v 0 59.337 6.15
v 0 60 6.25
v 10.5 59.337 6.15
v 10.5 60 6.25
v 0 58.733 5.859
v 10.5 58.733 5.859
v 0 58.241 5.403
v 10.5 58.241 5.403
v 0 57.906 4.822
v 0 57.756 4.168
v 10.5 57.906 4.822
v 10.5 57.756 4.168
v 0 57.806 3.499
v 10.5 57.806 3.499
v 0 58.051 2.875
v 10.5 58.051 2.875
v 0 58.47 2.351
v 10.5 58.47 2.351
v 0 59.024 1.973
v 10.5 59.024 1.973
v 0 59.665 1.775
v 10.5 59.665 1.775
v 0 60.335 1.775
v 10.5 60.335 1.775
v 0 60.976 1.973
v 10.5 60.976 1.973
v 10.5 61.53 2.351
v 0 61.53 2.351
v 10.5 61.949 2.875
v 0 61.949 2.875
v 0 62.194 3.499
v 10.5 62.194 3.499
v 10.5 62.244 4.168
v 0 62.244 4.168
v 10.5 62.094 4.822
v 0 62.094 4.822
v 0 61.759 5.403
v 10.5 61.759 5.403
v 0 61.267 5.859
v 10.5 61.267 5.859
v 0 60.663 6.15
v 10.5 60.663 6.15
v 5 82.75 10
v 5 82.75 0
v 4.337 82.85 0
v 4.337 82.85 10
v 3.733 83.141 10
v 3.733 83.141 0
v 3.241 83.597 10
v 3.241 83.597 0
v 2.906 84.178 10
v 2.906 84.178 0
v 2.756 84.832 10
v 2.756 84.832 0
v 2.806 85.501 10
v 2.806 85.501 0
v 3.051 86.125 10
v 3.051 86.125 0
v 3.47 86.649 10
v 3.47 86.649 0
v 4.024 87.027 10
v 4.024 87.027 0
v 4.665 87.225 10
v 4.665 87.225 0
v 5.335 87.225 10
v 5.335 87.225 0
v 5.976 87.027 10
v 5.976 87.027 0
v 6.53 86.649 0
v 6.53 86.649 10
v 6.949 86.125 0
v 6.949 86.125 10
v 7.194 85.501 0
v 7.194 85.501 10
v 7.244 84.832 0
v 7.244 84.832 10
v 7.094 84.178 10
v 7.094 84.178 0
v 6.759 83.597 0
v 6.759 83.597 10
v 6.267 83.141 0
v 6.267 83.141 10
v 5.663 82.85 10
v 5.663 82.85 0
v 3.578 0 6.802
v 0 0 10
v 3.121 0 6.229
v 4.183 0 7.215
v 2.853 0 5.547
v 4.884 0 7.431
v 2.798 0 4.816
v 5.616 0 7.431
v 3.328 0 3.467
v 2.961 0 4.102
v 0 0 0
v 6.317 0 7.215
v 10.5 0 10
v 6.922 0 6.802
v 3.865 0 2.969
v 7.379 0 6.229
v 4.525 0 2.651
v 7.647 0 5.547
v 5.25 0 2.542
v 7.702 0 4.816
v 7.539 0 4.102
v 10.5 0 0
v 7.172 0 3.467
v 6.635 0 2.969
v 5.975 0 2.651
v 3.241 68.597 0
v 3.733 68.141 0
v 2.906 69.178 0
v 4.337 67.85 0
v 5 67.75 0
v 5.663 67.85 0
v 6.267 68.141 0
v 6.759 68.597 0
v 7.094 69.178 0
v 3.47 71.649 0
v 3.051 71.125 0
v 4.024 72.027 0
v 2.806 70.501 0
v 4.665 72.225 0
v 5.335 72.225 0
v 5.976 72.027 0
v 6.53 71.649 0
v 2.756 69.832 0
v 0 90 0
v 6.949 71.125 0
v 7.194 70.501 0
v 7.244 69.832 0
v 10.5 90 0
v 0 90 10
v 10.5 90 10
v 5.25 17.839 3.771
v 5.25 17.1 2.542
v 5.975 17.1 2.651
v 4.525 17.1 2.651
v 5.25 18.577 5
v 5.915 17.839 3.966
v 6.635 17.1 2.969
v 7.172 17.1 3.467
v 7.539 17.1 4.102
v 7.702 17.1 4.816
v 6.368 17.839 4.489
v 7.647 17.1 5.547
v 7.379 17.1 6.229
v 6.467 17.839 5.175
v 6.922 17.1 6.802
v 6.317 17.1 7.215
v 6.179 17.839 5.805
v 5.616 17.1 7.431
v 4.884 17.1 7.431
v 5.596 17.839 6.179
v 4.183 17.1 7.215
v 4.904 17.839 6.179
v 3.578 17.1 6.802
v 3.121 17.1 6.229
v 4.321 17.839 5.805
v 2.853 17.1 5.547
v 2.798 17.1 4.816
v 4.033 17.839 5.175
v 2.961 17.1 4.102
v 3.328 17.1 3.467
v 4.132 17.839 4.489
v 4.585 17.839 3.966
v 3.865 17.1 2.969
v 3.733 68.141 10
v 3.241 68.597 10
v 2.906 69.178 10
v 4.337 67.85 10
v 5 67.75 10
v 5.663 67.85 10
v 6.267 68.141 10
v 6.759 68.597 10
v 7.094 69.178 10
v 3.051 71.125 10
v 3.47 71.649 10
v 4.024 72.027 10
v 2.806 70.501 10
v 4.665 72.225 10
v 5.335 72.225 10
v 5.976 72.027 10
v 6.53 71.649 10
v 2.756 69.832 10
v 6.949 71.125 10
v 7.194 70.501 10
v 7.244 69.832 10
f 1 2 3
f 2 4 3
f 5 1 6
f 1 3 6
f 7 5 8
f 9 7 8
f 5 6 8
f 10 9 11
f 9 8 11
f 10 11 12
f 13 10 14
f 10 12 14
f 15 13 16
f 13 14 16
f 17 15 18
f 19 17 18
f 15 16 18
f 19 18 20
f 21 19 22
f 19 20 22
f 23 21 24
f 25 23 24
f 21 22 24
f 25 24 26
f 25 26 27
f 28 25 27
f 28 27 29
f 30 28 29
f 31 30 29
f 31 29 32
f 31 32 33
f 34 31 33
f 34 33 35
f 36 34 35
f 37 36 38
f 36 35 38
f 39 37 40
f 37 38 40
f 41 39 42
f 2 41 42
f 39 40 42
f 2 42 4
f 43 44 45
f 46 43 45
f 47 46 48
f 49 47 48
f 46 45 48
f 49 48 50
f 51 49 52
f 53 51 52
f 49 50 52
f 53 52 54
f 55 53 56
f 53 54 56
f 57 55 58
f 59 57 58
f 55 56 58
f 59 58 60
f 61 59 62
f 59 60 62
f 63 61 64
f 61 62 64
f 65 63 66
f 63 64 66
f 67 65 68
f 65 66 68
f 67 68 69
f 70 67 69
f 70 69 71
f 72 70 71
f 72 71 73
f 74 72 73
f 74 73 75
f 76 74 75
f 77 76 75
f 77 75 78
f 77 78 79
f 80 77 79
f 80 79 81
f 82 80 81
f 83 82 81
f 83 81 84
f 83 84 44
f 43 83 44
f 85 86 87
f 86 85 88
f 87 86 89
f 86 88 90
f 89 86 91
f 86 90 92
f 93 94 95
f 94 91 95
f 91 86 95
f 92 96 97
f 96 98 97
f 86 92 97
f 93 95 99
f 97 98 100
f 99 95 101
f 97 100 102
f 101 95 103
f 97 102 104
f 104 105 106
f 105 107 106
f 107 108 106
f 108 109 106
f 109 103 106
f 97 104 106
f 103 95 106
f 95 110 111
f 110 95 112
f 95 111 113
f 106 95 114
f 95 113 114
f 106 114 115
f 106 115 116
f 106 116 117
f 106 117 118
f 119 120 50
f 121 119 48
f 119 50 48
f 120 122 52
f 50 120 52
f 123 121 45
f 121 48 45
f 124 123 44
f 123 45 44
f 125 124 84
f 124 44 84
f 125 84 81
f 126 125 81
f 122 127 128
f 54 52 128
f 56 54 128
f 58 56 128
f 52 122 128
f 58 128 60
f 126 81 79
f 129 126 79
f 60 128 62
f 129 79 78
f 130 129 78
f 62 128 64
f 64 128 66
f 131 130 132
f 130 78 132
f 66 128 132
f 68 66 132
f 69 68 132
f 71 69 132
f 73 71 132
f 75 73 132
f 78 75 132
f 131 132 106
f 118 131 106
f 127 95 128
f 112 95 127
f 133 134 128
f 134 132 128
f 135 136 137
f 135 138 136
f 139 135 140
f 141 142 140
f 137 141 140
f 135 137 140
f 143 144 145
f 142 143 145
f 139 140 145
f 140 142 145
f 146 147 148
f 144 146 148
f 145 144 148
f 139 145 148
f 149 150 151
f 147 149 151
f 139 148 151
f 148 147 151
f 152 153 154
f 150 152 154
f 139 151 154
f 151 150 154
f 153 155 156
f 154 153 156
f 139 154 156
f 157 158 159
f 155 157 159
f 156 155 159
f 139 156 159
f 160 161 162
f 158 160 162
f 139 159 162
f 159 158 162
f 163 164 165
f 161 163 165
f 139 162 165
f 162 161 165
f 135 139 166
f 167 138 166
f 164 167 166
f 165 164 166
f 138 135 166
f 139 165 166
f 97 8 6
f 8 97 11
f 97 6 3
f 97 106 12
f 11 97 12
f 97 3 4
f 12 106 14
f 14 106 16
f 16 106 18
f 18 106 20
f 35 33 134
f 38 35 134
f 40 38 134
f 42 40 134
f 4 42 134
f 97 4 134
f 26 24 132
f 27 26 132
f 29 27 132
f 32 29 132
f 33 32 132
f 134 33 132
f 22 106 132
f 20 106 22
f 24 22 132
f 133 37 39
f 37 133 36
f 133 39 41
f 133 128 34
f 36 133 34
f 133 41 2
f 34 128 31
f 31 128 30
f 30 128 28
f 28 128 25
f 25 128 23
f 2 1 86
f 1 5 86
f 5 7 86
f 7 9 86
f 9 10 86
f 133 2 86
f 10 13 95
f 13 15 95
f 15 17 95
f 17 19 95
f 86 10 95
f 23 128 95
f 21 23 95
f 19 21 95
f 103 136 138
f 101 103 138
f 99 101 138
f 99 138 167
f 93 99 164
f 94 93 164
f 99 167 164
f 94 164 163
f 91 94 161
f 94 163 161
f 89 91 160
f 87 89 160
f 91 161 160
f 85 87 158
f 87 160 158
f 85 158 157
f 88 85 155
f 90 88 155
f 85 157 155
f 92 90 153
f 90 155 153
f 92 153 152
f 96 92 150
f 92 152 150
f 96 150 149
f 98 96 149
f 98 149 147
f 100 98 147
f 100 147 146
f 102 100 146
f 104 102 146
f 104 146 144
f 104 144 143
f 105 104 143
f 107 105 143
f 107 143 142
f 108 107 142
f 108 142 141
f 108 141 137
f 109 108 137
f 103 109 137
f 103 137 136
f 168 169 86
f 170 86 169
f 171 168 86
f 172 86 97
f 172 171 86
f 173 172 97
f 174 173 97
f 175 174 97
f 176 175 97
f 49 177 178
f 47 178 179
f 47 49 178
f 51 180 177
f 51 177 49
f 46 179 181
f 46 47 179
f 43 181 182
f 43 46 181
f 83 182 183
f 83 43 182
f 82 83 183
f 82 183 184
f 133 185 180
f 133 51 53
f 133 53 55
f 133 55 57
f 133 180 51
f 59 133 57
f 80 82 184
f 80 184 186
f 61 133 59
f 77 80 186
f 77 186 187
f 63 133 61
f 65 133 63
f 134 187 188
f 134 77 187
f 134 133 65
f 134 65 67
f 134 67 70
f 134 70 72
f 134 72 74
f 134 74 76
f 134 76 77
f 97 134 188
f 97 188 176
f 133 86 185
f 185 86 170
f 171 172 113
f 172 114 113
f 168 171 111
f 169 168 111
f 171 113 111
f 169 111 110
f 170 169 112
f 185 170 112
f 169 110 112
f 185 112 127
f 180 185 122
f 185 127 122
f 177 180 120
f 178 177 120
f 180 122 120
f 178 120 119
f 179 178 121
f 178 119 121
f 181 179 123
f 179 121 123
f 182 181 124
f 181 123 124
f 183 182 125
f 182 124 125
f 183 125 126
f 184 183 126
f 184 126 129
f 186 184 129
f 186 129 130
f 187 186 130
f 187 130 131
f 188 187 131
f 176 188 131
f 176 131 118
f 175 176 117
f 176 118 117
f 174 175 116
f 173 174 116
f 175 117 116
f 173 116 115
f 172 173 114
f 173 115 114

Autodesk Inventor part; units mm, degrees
ref_plane "YZ Plane" through (0, 0, 0) normal (1, 0, 0) x (0, 1, 0)
ref_plane "XZ Plane" through (0, 0, 0) normal (0, 1, 0) x (-1, 0, 0)
ref_plane "XY Plane" through (0, 0, 0) normal (0, 0, 1) x (1, 0, 0)
sketch "Sketch1" plane through (0, 0, 0) normal (0, 0, 1) x (1, 0, 0)
  line L0 (0, 0) -> (10.5, 0)
  line L1 (10.5, 0) -> (10.5, 90)
  line L2 (10.5, 90) -> (0, 90)
  line L3 (0, 90) -> (0, 0)
  dimension "d0" = 10.5
  dimension "d1" = 90
extrude "Extrusion1" add sketch "Sketch1" along normal blind 10
sketch "Sketch4" plane through (0, 0, 10) normal (0, 0, 1) x (1, 0, 0)
  line L0 (0, 90) -> (0, 0) projected
  line L1 (10.5, 0) -> (10.5, 90) projected
  line L2 (10.5, 90) -> (0, 90) projected
  line L3 (0, 0) -> (10.5, 0) projected
  point P0 (0, 30)
  point P1 (0, 45)
sketch "Sketch5" plane through (0, 0, 0) normal (-1, 0, 0) x (0, 0, 1)
  circle A0 centre (4, 60) radius 2.5
  line L0 (0, 90) -> (0, 0) projected
  line L1 (0, 90) -> (10, 90) projected
  line L2 (0, 0) -> (10, 0) projected
  point P0 (5, 0)
  point P1 (5, 90)
  dimension "d15" = 5
  dimension "d24" = 4
  dimension "d40" = 30
hole "Hole2" at (0, 60, 4) direction (1, 0, 0) diameter 4.5 end through all clearance for "Countersunk Flat Head Screw ISO 2009/7046" size "M4" standard "ISO"
sketch "Sketch6" plane through (0, 0, 0) normal (0, -1, 0) x (1, 0, 0)
  line L0 (10.5, 6.25) -> (0, 6.25) projected
  line L1 (0, 0) -> (10.5, 0) construction
  line L2 (10.5, 0) -> (10.5, 10) construction
  line L3 (0, 10) -> (10.5, 10) construction
  line L4 (0, 0) -> (0, 10) construction
  point P0 (5.25, 5)
  dimension "d26" = 10
  dimension "d27" = 10.5
  dimension "d29" = 5
  dimension "d30" = 5.25
hole "Hole3" at (5.25, 0, 5) direction (0, 1, 0) diameter 4.917 depth 17.1 tip angle 118 thread size "M6x1" class "6H" standard "ISO Metric profile"
sketch "Sketch8" plane through (0, 0, 10) normal (0, 0, 1) x (1, 0, 0)
  line L0 (0, 90) -> (0, 0) projected
  line L1 (10.5, 90) -> (0, 90) projected
  point P0 (5, 85)
  point P1 (5, 70)
  dimension "d42" = 5
  dimension "d43" = 5
  dimension "d44" = 5
  dimension "d45" = 15
hole "Hole4" at (5, 85, 10) at (5, 70, 10) direction (0, 0, -1) diameter 4.5 end through all clearance for "Countersunk Flat Head Screw ISO 2009/7046" size "M4" standard "ISO"
equation "\"d29\" = 0.5 * d26"
equation "\"d30\" = 0.5 * d27"
equation "\"d43\" = d42"
properties part number "Flange"
